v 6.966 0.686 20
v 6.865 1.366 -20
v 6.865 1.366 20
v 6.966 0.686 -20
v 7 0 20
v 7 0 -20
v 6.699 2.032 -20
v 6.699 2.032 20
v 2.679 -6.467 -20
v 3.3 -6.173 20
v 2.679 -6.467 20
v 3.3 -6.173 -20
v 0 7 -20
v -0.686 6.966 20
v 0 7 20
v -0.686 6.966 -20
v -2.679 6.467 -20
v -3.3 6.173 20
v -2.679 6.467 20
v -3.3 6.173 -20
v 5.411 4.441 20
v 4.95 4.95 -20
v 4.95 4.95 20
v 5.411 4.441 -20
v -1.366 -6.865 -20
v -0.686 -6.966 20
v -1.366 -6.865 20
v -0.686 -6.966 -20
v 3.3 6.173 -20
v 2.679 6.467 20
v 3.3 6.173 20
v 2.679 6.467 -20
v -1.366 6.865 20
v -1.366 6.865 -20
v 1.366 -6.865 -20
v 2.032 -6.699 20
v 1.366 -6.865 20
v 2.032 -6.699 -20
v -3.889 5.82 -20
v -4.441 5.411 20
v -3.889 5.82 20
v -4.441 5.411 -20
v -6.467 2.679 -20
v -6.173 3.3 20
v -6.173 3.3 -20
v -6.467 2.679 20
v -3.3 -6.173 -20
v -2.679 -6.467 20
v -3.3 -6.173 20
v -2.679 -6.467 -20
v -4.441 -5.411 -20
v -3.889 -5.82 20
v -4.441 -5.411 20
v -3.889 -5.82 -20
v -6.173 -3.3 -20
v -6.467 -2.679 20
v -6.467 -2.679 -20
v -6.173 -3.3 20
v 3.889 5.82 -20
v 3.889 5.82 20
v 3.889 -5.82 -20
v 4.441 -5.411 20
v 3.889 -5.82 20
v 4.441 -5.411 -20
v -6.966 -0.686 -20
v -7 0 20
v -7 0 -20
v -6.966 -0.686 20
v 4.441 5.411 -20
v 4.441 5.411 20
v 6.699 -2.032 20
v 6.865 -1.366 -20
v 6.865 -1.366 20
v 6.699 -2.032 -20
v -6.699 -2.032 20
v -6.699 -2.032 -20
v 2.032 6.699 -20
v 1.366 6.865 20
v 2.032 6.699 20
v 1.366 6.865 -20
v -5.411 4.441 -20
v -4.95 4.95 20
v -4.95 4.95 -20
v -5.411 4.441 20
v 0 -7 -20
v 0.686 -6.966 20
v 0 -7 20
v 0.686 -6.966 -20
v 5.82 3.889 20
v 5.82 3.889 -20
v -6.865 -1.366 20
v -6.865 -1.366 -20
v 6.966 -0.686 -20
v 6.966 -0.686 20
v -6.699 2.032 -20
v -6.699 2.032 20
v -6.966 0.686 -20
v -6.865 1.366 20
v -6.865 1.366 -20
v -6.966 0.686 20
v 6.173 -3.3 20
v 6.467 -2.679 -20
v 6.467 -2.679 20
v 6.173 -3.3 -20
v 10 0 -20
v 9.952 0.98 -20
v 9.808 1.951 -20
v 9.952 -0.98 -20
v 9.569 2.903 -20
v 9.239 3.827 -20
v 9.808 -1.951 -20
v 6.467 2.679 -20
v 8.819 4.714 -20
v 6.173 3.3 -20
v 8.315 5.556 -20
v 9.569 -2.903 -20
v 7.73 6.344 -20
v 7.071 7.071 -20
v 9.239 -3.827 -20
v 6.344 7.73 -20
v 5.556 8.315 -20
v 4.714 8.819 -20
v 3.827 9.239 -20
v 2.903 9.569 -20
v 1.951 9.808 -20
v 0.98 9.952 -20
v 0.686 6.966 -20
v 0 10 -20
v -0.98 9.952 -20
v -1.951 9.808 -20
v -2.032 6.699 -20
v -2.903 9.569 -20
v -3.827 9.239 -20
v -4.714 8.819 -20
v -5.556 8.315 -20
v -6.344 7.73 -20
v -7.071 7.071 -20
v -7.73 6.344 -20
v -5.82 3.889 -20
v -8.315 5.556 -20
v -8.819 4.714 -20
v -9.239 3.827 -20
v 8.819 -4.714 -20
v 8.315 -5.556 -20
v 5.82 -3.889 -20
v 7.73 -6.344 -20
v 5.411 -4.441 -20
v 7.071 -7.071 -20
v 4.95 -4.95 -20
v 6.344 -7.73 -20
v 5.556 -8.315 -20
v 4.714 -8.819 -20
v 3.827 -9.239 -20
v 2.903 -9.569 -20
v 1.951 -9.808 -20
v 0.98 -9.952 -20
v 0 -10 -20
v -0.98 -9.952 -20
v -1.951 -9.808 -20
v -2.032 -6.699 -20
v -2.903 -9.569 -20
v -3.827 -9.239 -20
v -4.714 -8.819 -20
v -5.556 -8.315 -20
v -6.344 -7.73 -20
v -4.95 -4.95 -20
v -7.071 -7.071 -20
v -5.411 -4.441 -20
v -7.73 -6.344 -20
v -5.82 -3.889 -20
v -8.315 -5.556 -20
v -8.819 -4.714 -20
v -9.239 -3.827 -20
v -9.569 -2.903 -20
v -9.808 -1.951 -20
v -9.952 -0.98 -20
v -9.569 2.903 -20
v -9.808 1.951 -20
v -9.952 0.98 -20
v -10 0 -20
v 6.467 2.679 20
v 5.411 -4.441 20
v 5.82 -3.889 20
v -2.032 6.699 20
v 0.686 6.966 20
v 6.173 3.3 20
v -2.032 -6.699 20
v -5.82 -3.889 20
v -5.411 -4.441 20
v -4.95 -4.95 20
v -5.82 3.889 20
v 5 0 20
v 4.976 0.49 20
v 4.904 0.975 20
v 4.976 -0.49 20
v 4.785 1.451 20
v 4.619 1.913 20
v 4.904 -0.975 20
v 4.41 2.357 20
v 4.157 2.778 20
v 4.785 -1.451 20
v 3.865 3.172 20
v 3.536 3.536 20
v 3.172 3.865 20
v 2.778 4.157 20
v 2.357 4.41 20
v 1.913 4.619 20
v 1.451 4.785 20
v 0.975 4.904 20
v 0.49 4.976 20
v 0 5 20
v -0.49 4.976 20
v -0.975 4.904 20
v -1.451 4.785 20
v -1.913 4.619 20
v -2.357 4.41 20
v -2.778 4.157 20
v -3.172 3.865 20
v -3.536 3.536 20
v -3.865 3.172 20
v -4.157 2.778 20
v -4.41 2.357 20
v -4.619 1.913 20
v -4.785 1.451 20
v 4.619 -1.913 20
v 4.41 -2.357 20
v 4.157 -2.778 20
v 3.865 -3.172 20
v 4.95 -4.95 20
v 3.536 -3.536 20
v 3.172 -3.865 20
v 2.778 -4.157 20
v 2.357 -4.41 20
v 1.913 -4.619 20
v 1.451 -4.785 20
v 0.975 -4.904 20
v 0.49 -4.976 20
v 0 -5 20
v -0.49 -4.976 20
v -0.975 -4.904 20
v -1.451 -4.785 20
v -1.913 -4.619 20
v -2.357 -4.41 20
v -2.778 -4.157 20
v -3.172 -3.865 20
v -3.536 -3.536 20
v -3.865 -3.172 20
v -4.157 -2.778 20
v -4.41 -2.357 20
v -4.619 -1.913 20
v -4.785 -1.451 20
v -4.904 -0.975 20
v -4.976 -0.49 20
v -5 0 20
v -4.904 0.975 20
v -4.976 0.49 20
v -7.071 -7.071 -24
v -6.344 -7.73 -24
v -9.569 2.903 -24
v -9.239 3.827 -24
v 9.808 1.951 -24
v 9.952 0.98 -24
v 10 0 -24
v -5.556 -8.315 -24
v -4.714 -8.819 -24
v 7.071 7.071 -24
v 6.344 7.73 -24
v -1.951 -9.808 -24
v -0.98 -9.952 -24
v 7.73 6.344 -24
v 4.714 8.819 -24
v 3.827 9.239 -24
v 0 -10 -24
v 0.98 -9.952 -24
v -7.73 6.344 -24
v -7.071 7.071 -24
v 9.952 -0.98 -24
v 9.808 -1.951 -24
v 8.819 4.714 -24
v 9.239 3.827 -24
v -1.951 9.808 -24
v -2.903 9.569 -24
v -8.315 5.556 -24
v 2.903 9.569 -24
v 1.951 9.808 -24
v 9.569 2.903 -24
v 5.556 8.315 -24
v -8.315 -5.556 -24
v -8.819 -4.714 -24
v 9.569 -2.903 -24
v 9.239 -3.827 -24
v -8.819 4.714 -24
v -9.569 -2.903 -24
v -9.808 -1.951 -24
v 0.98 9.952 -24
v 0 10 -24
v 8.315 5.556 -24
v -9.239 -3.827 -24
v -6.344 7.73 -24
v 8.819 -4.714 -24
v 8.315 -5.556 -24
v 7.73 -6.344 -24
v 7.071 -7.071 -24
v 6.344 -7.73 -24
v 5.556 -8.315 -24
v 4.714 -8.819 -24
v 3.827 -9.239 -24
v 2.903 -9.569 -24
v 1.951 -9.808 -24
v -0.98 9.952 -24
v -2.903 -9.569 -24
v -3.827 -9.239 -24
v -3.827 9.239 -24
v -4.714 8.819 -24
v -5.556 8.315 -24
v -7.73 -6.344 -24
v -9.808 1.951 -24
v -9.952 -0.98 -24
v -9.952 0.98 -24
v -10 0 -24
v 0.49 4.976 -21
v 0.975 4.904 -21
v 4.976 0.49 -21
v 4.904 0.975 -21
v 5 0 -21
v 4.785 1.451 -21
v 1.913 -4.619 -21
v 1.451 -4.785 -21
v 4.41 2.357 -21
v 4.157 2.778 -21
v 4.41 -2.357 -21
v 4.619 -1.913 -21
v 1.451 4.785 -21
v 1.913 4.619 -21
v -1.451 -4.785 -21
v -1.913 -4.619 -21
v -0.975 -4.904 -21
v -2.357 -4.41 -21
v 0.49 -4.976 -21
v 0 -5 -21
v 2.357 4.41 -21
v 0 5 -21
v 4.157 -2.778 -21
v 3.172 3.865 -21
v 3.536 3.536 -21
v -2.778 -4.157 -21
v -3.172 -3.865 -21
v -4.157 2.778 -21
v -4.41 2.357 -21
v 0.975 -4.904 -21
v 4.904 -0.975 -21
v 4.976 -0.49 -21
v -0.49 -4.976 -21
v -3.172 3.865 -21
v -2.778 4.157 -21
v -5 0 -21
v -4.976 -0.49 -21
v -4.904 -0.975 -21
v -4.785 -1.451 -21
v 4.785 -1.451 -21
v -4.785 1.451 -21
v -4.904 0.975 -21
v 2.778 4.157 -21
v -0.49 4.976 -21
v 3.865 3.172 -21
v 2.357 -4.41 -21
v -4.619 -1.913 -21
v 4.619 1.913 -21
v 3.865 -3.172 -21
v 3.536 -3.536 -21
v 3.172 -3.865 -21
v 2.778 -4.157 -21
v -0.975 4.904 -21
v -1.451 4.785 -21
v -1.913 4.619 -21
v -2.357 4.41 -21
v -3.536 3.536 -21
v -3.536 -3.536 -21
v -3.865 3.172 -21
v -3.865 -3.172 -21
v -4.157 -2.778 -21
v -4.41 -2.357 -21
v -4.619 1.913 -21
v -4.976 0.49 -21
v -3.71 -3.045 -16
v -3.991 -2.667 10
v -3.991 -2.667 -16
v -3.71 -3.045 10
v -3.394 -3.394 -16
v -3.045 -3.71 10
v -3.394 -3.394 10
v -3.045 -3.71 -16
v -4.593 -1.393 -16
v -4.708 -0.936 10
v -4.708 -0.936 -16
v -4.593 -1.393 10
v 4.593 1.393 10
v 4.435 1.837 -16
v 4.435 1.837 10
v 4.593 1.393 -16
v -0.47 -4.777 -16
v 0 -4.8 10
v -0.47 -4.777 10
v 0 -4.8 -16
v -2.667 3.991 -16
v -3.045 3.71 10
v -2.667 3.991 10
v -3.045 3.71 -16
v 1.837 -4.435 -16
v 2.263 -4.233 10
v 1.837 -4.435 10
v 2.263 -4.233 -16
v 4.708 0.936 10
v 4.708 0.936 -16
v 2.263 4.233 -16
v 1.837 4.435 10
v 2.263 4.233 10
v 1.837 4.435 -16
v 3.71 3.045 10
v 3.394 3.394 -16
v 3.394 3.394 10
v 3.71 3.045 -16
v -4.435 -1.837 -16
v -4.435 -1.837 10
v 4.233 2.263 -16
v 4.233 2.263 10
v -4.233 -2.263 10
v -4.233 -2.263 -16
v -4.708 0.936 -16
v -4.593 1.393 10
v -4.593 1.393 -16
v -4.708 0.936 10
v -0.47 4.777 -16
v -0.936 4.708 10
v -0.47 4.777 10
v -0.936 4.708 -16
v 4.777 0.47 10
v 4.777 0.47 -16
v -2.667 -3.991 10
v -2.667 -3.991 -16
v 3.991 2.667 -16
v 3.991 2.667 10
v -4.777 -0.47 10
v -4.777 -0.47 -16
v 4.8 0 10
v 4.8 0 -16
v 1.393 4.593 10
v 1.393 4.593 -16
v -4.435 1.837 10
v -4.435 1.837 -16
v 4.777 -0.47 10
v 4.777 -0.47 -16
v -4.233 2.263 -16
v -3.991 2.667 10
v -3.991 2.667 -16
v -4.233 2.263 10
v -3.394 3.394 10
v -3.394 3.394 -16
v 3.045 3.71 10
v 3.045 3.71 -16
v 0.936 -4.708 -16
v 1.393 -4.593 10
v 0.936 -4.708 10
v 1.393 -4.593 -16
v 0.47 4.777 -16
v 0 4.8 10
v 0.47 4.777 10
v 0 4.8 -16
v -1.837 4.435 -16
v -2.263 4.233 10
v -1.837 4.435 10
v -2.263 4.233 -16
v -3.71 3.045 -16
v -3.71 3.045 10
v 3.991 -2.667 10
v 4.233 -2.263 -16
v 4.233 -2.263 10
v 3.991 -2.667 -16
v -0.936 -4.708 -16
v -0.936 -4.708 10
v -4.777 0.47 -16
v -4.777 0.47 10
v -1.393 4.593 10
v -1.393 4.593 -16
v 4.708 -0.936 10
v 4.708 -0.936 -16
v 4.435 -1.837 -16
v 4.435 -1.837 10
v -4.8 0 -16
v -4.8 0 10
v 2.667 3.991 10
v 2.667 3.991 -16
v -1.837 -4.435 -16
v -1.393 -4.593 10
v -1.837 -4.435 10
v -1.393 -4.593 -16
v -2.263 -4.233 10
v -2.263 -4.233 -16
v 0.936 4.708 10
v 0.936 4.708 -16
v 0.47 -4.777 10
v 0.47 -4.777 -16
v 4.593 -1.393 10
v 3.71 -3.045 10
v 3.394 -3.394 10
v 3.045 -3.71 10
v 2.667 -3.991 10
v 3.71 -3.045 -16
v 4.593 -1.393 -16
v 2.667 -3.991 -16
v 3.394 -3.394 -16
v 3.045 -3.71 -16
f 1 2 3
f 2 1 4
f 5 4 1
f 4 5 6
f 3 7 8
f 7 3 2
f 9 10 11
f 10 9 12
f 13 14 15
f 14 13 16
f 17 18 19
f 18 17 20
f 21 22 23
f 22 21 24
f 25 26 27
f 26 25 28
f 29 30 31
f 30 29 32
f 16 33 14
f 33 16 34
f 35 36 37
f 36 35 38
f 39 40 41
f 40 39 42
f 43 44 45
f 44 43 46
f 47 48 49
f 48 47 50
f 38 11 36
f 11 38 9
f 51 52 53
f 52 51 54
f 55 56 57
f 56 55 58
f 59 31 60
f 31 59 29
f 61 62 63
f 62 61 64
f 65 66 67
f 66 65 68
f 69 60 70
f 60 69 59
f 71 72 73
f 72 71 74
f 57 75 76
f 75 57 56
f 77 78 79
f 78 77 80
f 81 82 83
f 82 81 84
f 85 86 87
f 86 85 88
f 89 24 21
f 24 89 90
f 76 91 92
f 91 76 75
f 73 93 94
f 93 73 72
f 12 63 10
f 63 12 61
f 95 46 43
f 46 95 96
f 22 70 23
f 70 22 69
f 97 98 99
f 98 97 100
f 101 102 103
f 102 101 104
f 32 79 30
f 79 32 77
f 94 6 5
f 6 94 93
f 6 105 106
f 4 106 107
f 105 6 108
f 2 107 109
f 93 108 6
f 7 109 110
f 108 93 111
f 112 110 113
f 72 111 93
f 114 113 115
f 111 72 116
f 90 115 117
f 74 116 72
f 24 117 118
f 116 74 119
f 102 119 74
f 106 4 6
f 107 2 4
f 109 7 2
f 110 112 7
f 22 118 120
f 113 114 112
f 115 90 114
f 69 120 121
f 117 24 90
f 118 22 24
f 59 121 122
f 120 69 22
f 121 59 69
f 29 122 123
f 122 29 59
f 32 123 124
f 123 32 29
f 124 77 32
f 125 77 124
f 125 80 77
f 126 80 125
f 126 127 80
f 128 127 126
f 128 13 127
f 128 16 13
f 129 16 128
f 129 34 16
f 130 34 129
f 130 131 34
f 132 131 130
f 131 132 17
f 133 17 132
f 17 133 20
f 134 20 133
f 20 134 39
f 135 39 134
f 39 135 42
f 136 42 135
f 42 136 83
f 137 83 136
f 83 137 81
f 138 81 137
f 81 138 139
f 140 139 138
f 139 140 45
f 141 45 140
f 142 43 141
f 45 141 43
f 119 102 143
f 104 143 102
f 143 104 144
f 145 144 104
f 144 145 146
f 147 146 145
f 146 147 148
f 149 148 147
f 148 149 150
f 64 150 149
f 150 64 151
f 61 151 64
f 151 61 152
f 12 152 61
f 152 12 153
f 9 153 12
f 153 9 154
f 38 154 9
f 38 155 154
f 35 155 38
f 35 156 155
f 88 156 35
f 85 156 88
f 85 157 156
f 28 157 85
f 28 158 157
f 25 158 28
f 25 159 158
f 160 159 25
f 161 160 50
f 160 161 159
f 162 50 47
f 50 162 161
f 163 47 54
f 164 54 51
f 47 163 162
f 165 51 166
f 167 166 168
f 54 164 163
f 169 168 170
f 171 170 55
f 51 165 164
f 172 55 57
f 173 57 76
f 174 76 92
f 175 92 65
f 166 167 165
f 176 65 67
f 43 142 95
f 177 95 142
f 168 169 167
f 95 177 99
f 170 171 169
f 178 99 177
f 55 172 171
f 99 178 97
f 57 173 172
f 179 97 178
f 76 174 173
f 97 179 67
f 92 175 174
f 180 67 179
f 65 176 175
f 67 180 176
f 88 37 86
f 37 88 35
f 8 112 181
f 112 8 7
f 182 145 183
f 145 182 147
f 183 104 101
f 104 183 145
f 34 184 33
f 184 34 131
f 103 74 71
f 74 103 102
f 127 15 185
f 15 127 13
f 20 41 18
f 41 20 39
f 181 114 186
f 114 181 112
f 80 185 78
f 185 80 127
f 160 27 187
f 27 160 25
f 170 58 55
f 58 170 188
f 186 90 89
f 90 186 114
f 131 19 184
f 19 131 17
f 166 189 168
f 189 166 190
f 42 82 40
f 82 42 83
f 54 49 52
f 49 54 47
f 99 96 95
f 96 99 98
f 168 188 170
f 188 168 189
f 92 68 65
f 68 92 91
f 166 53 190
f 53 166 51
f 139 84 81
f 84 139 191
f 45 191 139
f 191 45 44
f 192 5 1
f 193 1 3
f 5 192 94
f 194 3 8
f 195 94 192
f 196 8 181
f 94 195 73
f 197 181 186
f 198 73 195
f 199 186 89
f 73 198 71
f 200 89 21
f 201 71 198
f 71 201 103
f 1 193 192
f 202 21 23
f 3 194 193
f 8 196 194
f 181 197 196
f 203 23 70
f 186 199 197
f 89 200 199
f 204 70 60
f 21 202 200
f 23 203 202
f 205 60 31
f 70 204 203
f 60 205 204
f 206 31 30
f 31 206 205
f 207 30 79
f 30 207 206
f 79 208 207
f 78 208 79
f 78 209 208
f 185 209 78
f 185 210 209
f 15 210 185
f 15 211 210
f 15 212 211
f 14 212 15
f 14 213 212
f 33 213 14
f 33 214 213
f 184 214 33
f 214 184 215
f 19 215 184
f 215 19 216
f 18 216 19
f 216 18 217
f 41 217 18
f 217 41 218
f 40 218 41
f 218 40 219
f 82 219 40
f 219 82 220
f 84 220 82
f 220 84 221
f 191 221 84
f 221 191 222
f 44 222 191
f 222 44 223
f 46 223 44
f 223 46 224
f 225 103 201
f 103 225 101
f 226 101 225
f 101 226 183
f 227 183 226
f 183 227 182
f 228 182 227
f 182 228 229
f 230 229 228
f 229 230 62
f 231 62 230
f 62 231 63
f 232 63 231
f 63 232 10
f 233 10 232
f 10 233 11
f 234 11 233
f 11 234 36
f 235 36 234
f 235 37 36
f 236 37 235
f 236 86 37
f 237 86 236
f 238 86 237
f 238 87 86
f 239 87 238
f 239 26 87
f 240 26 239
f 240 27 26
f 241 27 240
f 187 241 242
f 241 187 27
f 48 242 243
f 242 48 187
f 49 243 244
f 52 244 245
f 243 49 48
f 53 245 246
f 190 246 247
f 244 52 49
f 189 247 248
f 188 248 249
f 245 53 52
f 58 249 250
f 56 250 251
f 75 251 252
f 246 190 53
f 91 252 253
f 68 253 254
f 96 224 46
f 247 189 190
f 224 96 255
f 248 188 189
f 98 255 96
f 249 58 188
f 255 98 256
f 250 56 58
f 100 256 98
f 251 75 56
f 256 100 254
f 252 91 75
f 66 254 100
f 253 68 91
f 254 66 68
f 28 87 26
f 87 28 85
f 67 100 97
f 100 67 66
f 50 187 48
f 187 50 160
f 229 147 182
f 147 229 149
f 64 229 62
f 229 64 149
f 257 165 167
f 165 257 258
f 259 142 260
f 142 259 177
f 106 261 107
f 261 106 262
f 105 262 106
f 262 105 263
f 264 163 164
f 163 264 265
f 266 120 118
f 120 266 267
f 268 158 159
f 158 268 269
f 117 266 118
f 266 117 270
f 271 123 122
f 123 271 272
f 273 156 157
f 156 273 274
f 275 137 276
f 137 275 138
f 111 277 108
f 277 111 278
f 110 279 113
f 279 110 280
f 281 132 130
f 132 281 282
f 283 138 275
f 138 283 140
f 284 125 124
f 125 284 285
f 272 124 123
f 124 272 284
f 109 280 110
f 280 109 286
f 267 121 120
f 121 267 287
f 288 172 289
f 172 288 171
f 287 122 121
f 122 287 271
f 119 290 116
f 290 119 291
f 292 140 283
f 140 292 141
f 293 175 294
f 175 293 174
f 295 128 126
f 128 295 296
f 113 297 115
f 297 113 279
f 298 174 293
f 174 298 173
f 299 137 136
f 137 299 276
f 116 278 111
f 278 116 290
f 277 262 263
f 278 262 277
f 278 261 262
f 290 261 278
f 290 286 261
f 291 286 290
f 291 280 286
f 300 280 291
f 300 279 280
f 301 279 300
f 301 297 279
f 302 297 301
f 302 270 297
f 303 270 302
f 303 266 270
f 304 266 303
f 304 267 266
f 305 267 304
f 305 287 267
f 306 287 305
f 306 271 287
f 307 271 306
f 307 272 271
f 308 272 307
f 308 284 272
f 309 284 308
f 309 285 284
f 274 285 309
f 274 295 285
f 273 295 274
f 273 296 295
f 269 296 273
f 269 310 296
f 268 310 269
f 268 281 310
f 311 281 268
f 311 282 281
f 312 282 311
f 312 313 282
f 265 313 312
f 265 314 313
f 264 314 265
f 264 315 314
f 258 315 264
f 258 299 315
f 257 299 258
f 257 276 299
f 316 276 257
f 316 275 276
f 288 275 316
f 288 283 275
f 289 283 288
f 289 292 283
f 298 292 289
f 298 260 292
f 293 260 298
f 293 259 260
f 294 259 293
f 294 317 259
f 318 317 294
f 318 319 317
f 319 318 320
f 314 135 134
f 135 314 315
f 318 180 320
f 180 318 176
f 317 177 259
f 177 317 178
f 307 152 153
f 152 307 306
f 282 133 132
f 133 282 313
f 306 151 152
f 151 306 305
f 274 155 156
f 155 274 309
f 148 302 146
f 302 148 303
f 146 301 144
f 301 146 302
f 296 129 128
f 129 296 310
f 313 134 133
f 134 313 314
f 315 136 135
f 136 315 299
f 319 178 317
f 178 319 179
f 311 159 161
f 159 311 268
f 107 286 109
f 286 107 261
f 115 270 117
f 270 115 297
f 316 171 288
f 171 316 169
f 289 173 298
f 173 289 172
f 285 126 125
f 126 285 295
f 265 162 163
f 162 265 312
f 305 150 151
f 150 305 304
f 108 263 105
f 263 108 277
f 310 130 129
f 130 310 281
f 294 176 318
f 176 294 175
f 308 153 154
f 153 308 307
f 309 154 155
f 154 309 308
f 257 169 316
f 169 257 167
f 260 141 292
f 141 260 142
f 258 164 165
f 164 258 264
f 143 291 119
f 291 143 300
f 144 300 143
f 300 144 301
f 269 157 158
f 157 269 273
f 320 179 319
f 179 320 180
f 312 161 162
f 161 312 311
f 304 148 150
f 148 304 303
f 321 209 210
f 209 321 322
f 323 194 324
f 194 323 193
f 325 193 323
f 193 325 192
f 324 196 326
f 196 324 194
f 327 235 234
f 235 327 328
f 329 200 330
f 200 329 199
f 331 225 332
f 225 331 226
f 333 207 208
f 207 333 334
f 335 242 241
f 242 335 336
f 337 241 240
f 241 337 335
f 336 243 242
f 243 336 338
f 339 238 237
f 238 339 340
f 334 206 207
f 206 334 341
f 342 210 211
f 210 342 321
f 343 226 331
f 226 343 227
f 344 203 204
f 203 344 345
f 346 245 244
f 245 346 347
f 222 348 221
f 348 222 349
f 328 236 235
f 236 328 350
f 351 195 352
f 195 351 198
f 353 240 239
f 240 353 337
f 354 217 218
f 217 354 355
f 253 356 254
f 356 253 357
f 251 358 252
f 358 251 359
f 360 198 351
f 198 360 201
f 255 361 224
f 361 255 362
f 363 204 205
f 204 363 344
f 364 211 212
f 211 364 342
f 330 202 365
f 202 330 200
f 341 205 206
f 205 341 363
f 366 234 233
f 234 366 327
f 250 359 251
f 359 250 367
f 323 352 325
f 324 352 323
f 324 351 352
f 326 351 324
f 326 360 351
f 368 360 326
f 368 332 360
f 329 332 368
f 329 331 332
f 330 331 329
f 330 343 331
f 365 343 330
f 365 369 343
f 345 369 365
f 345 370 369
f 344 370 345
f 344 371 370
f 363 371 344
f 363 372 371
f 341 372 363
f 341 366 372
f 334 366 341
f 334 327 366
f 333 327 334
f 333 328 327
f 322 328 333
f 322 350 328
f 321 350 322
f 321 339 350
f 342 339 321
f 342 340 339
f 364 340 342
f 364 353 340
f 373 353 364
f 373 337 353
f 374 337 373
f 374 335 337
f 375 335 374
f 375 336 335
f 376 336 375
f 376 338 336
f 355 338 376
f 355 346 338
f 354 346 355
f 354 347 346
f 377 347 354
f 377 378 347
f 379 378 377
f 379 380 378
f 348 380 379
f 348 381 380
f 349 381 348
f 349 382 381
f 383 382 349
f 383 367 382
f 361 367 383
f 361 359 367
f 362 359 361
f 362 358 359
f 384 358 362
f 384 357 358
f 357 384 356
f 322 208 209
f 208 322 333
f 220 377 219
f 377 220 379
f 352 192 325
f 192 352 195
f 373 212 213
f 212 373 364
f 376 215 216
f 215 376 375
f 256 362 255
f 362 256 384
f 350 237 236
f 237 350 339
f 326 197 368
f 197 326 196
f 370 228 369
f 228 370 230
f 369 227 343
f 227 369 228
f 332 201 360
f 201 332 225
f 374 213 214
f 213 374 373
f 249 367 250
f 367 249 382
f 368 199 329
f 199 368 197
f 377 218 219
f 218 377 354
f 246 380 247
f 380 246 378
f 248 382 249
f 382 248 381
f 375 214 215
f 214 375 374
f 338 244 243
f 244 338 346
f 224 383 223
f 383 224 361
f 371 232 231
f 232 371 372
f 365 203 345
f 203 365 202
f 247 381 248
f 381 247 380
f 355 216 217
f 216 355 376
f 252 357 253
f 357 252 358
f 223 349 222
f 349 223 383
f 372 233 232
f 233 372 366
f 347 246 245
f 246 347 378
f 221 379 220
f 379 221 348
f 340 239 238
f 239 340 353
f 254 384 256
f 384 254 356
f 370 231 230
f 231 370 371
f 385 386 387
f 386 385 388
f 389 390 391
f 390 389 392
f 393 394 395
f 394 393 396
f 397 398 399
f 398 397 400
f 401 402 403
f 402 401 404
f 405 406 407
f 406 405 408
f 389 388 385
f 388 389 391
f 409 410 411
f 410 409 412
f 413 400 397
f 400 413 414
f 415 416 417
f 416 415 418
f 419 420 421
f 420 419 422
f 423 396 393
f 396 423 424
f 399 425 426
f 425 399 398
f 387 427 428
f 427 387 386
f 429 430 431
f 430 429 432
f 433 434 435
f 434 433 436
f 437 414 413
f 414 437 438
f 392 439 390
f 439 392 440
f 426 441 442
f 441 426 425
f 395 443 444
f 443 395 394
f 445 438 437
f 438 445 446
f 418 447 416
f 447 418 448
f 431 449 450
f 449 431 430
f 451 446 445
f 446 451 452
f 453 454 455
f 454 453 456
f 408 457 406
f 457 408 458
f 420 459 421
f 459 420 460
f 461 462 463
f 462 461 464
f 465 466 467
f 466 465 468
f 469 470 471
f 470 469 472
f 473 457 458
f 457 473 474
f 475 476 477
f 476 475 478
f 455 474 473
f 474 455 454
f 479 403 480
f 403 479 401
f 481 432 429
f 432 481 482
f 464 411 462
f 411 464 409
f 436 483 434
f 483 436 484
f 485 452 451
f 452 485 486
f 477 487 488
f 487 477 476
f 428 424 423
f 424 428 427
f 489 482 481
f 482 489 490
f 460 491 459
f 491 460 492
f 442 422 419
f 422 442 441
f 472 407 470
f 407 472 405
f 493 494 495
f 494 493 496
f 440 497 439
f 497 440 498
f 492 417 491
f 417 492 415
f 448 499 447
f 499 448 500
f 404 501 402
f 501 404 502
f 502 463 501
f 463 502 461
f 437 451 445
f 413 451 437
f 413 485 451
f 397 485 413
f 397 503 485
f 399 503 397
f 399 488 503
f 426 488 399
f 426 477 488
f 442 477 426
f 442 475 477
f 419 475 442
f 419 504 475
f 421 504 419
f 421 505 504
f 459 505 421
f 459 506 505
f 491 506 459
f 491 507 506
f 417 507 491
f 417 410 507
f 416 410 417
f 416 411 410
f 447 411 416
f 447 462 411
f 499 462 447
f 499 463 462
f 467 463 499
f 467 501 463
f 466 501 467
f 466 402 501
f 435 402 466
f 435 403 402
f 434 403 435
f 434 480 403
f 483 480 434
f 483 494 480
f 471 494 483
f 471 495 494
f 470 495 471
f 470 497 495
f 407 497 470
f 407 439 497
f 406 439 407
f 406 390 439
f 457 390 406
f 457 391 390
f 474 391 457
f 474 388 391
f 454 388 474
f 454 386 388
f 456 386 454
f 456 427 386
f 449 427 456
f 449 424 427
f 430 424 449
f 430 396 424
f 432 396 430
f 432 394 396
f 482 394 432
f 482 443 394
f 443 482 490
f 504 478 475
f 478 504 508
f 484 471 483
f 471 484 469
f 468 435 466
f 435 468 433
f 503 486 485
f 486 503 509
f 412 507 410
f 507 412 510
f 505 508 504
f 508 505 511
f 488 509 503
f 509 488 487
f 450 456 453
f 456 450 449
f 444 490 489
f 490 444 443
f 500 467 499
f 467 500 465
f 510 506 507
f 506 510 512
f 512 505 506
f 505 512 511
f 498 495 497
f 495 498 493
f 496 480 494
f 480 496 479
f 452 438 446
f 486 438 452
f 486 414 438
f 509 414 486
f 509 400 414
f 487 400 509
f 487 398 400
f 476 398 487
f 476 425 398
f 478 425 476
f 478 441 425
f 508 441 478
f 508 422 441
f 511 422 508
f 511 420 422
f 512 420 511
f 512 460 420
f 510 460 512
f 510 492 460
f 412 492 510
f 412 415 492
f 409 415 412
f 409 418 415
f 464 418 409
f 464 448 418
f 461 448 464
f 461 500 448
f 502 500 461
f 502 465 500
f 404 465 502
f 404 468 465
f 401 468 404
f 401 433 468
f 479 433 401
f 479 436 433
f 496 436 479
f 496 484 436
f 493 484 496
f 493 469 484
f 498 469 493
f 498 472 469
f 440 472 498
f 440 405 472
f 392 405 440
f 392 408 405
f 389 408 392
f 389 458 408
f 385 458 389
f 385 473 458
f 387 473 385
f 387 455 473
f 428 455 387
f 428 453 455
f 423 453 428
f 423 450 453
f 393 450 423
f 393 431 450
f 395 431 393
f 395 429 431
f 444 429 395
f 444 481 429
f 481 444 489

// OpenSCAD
// Original cylindrical prismatic guide fixture with an embedded declaration.
// The declaration is a proposal; the verifier measures the rendered surfaces.
/* AGENTSCAD_ASSEMBLY_V1
{"schemaVersion":1,"units":"mm","coordinateSystem":"right-handed","parts":[{"id":"guide","name":"Guide","selector":"guide","source":"generated","material":null},{"id":"slider","name":"Slider","selector":"slider","source":"generated","material":null}],"instances":[{"id":"guide1","partId":"guide","subassemblyId":null,"transform":[1,0,0,0,0,1,0,0,0,0,1,0,0,0,0,1]},{"id":"slider1","partId":"slider","subassemblyId":null,"transform":[1,0,0,0,0,1,0,0,0,0,1,0,0,0,0,1]}],"subassemblies":[],"connections":[{"id":"slide","type":"prismatic","a":"slider1","b":"guide1","frameA":{"origin":[0,0,0],"direction":[0,0,1]},"frameB":{"origin":[0,0,0],"direction":[0,0,1]},"range":null,"pitchMm":null,"ratio":null,"boreInstanceId":"guide1","fitStationsMm":[-5,0,5],"allowedContact":[]}],"groundedInstanceId":"guide1","motions":[],"operations":[],"manufacturing":null,"assumptions":["Cylindrical block guide declared as a prismatic bore/shaft pair; only listed stations are measured."],"unknowns":[]}
END_AGENTSCAD_ASSEMBLY */
$fn = 64;

agentscad_part = "all";

guide_outer_radius = 7;
guide_inner_radius = 5;
guide_length = 40;
slider_radius = 4.8;
slider_length = 20;

module guide_part() {
  difference() {
    union() {
      cylinder(h = guide_length, r = guide_outer_radius, center = true);
      translate([0, 0, -guide_length / 2 - 2])
        cylinder(h = 4, r = guide_outer_radius + 3, center = true);
    }
    cylinder(h = guide_length + 2, r = guide_inner_radius, center = true);
  }
}

module slider_part() {
  cylinder(h = slider_length, r = slider_radius, center = true);
  translate([0, 0, -slider_length / 2 - 3])
    cylinder(h = 6, r = slider_radius, center = true);
}

module generated_part() {
  if (agentscad_part == "guide") {
    guide_part();
  } else if (agentscad_part == "slider") {
    slider_part();
  } else {
    guide_part();
    slider_part();
  }
}

generated_part();
